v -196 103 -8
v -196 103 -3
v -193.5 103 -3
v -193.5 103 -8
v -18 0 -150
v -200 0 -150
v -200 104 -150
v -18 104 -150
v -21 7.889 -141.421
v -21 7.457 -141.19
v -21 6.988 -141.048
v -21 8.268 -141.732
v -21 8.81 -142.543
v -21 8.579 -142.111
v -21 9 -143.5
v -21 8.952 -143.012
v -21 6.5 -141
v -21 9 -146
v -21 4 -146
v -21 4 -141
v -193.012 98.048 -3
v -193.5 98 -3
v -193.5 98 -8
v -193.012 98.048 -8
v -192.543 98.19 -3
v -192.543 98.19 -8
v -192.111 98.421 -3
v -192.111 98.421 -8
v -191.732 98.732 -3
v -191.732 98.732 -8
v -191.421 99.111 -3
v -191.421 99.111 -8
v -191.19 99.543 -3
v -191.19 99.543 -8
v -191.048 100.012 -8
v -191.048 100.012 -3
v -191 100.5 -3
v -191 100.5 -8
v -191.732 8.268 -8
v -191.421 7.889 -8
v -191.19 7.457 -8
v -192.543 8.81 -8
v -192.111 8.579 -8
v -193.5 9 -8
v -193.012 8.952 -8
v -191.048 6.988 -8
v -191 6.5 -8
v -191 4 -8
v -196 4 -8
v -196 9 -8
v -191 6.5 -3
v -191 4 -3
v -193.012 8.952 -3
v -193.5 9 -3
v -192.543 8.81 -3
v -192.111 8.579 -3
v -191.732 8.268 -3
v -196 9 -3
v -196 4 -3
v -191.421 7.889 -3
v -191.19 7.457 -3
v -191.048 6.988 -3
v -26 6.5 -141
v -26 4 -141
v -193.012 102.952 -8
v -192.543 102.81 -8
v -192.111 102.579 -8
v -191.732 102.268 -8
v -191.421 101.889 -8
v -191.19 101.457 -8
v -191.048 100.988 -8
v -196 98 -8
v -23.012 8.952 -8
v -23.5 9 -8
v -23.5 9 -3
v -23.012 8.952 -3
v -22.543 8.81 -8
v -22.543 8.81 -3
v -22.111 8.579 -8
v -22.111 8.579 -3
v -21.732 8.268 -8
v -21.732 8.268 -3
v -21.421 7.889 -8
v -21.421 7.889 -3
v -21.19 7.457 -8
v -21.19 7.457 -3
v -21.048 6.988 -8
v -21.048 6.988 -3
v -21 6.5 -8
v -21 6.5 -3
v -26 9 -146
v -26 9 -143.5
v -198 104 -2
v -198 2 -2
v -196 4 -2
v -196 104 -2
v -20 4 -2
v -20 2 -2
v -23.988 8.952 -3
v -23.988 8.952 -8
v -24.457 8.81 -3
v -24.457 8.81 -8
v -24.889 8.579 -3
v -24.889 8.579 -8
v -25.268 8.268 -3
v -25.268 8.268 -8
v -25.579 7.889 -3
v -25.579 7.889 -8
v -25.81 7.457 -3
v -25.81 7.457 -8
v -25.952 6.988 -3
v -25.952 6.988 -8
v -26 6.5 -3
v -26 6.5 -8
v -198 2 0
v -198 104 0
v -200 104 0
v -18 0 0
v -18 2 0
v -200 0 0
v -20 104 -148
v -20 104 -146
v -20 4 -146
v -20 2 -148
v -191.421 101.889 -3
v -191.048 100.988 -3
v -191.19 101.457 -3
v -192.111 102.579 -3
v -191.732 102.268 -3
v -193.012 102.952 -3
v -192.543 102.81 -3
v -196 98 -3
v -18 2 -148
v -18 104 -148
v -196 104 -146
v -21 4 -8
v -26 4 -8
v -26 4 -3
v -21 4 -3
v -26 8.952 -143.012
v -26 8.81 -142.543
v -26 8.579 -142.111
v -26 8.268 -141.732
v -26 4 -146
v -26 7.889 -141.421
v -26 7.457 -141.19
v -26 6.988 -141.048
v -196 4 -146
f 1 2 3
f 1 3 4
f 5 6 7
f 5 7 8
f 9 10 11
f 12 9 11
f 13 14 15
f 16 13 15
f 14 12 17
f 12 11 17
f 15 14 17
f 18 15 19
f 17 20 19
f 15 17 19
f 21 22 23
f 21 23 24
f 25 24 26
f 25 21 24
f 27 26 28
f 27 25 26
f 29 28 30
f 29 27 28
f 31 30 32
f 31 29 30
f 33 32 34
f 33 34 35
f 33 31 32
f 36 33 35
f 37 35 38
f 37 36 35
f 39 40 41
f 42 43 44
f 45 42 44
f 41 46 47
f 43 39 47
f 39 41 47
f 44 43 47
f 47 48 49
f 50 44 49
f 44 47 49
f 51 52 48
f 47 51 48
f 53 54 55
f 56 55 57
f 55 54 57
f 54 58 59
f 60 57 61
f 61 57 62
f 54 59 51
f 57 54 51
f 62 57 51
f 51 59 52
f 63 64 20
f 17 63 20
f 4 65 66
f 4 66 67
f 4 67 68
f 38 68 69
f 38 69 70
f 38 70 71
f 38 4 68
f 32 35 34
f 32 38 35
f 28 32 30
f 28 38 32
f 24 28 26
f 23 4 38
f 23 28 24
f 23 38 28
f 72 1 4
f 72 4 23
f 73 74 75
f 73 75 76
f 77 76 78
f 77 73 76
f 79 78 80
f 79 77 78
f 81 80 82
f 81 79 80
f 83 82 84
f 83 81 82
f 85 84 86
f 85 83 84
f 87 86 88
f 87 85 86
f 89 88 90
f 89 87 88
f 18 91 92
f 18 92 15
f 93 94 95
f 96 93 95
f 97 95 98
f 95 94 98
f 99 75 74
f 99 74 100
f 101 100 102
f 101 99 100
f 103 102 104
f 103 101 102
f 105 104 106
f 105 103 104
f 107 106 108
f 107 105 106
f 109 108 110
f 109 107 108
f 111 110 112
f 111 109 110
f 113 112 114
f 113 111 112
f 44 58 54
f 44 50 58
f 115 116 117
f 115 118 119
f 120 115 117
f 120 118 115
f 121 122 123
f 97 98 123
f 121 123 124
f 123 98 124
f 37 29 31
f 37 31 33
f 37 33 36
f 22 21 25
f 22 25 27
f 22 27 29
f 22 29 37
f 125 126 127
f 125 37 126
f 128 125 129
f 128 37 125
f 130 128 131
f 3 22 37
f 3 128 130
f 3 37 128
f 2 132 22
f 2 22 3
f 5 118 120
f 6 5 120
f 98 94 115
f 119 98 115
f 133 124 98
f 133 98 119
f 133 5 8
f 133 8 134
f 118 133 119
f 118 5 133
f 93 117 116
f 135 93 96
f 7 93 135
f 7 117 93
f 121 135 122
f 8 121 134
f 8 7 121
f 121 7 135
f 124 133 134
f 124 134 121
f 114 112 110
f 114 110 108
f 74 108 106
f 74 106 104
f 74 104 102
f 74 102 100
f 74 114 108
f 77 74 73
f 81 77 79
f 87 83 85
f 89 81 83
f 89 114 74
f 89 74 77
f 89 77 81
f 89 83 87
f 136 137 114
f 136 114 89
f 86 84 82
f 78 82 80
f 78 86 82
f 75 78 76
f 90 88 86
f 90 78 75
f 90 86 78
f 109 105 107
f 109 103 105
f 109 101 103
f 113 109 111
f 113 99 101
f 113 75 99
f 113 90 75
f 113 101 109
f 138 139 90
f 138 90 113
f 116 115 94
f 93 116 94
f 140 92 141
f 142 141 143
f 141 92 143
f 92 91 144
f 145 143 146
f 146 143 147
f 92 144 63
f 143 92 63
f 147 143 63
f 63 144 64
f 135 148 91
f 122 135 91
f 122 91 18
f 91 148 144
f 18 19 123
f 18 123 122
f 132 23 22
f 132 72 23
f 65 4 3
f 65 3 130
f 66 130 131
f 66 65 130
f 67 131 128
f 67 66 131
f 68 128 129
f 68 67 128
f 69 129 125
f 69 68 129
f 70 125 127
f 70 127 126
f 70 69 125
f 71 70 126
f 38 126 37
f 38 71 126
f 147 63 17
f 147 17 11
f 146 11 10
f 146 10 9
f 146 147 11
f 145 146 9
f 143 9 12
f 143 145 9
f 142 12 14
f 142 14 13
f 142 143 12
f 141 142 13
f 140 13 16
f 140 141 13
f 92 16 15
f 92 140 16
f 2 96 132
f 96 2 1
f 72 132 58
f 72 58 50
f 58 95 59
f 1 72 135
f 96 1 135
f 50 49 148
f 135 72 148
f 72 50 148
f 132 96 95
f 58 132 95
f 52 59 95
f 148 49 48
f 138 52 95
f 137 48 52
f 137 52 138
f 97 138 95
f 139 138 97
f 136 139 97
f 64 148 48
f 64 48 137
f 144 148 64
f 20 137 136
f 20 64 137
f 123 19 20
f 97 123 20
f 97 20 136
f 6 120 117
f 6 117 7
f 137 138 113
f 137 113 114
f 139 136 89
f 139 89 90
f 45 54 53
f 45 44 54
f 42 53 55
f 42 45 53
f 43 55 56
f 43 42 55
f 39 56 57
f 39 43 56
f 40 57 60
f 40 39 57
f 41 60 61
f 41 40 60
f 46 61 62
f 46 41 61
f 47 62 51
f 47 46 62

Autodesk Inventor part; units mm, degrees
ref_plane "YZ Plane" through (0, 0, 0) normal (1, 0, 0) x (0, 1, 0)
ref_plane "XZ Plane" through (0, 0, 0) normal (0, 1, 0) x (-1, 0, 0)
sketch "Sketch1" plane through (0, 0, 0) normal (0, 1, 0) x (-1, 0, 0)
  line L0 (0, 0) -> (200, 0)
  line L1 (200, 0) -> (200, -150)
  line L2 (200, -150) -> (0, -150)
  line L3 (0, -150) -> (0, 0)
  dimension "d0" = 200
  dimension "d1" = 150
extrude "Extrusion1" add sketch "Sketch1" along normal blind 2
sketch "Sketch2" plane through (0, 2, 0) normal (0, 1, 0) x (1, 0, 0)
  line L0 (-200, 0) -> (0, 0) projected
  line L1 (-200, 0) -> (-200, 2)
  line L2 (-200, 150) -> (-200, 0) projected
  line L3 (-200, 2) -> (-2, 2)
  line L4 (-2, 2) -> (-2, 150)
  line L5 (0, 150) -> (-200, 150) projected
  line L6 (-200, 2) -> (-200, 150)
  line L7 (-200, 150) -> (-2, 150)
  dimension "d4" = 2
  dimension "d5" = 198
extrude "Extrusion2" add sketch "Sketch2" along normal blind 2
sketch "Sketch3" plane through (0, 4, 0) normal (0, 1, 0) x (1, 0, 0)
  line L0 (0, 0) -> (0, 150) projected
  line L1 (0, 0) -> (-198, 0)
  line L2 (-198, 0) -> (-198, 148)
  line L3 (-198, 148) -> (0, 148)
  line L4 (0, 148) -> (0, 0)
  line L5 (0, 150) -> (-200, 150) projected
  line L6 (-200, 150) -> (0, 150)
  line L7 (0, 150) -> (0, 0)
  line L8 (0, 0) -> (-200, 0)
  line L9 (-200, 0) -> (-200, 150)
  dimension "d8" = 198
  dimension "d9" = 148
extrude "Extrusion3" add sketch "Sketch3" along normal blind 100 and the other way blind 2 contours L3 L2 L8 L9 L5 L0
sketch "Sketch4" plane through (0, 4, 0) normal (0, 1, 0) x (1, 0, 0)
  line L0 (-198, 2) -> (-2, 2) projected
  line L1 (-198, 2) -> (-196, 2)
  line L2 (-196, 2) -> (-196, 146)
  line L3 (-2, 148) -> (-198, 148) projected
  line L4 (-196, 146) -> (-2, 146)
  line L5 (-2, 2) -> (-2, 148) projected
  line L6 (-2, 2) -> (-198, 2)
  line L7 (-198, 2) -> (-198, 148)
  line L8 (-198, 148) -> (-2, 148)
  line L9 (-2, 148) -> (-2, 2)
  point P0 (0, 0)
  dimension "d14" = 2
  dimension "d15" = 144
extrude "Extrusion4" add sketch "Sketch4" along normal blind 100 contours L7 L3 L5 L4 L2 L0
sketch "Sketch7" plane through (0, 4, 0) normal (0, 1, 0) x (1, 0, 0)
  line L0 (-196, 2) -> (-2, 2) projected
  line L1 (-196, 2) -> (-196, 3)
  line L2 (-196, 146) -> (-196, 2) projected
  line L3 (-196, 3) -> (-191, 3)
  line L4 (-191, 3) -> (-191, 8)
  line L5 (-191, 8) -> (-196, 8)
  point P0 (0, 0)
  point P1 (-196, 117.9293)
  dimension "d36" = 1
  dimension "d37" = 5
  dimension "d38" = 5
extrude "Extrusion7" add sketch "Sketch7" along normal blind 5
fillet "Fillet2" radius 2.5 1 edges at (-191, 9, -5.5)
sketch "Sketch9" plane through (0, 4, 0) normal (0, 1, 0) x (1, 0, 0)
  line L0 (-196, 2) -> (-2, 2) projected
  line L1 (-2, 2) -> (-2, 3)
  line L2 (-2, 2) -> (-2, 146) projected
  line L3 (-2, 3) -> (-3, 3)
  line L4 (-3, 3) -> (-8, 3)
  line L5 (-8, 3) -> (-8, 8)
  line L6 (-8, 8) -> (-3, 8)
  line L7 (-3, 8) -> (-3, 3)
  point P0 (0, 0)
  dimension "d45" = 1
  dimension "d46" = 1
  dimension "d47" = 5
  dimension "d48" = 5
extrude "Extrusion9" add sketch "Sketch9" along normal blind 5
fillet "Fillet3" radius 2.5 2 edges at (-8, 9, -5.5) (-3, 9, -5.5)
sketch "Sketch10" plane through (-8, 4, -3) normal (0, 0, 1) x (1, 0, 0)
  arc A0 (5, 2.5) -> (0, 2.5) centre (2.5, 2.5) ccw projected
  circle A1 centre (2.5, 2.5) radius 1
  point P0 (8, -4)
  dimension "d52" = 2
extrude "Extrusion10" cut sketch "Sketch10" against normal blind 5
sketch "Sketch11" plane through (0, 4, 0) normal (0, 1, 0) x (1, 0, 0)
  line L0 (-2, 146) -> (-196, 146) projected
  line L1 (-2, 146) -> (-3, 146)
  line L2 (-3, 146) -> (-8, 146)
  line L3 (-8, 146) -> (-8, 141)
  line L4 (-8, 141) -> (-3, 141)
  line L5 (-3, 141) -> (-3, 146)
  point P0 (0, 0)
  point P1 (-144.9293, 146)
  dimension "d55" = 1
  dimension "d56" = 5
  dimension "d57" = 5
extrude "Extrusion11" add sketch "Sketch11" along normal blind 5
fillet "Fillet4" radius 2.5 1 edges at (-5.5, 9, -141)
sketch "Sketch12" plane through (-3, 4, -141) normal (1, 0, 0) x (0, 0, -1)
  arc A0 (2.5, 5) -> (0, 2.5) centre (2.5, 2.5) ccw projected
  circle A1 centre (2.5, 2.5) radius 1
  point P0 (-141, -4)
  dimension "d61" = 2
extrude "Extrusion12" cut sketch "Sketch12" against normal blind 5
sketch "Sketch13" plane through (-196, 104, -146) normal (0, 0, 1) x (1, 0, 0)
  line L0 (0, 0) -> (194, 0) projected
  line L1 (194, 0) -> (193, 0)
  line L2 (193, 0) -> (193, -1)
  line L3 (193, -1) -> (188, -1)
  line L4 (188, -1) -> (188, -6)
  line L5 (188, -6) -> (193, -6)
  line L6 (193, -6) -> (193, -1)
  point P0 (196, -104)
  dimension "d64" = 1
  dimension "d65" = 1
  dimension "d66" = 5
  dimension "d67" = 5
extrude "Extrusion13" add sketch "Sketch13" along normal blind 5
fillet "Fillet5" radius 2.5 2 edges at (-5.5, 103, -141) (-5.5, 98, -141)
sketch "Sketch14" plane through (-3, 98, -146) normal (1, 0, 0) x (0, 0, -1)
  arc A0 (-2.5, 5) -> (-2.5, 0) centre (-2.5, 2.5) ccw projected
  circle A1 centre (-2.5, 2.5) radius 1
  point P0 (-146, -98)
  dimension "d71" = 2
extrude "Extrusion14" cut sketch "Sketch14" against normal blind 5
sketch "Sketch15" plane through (-196, 4, -2) normal (1, 0, 0) x (0, 0, -1)
  line L0 (0, 100) -> (0, -2) projected
  line L1 (0, 100) -> (1, 100)
  line L2 (148, 100) -> (-2, 100) projected
  line L3 (1, 100) -> (1, 99)
  line L4 (1, 99) -> (6, 99)
  line L5 (6, 99) -> (6, 94)
  line L6 (6, 94) -> (1, 94)
  line L7 (1, 94) -> (1, 99)
  point P0 (-2, -4)
  dimension "d74" = 1
  dimension "d75" = 1
  dimension "d76" = 5
  dimension "d77" = 5
extrude "Extrusion15" add sketch "Sketch15" along normal blind 5
fillet "Fillet6" radius 2.5 2 edges at (-191, 103, -5.5) (-191, 98, -5.5)
sketch "Sketch17" plane through (0, 4, 0) normal (0, 1, 0) x (1, 0, 0)
  point P0 (0, 0)
sketch "Sketch18" plane through (0, 4, 0) normal (0, 1, 0) x (1, 0, 0)
  line L0 (-196, 2) -> (-196, 146) projected
  line L1 (-196, 84.7457) -> (-26, 84.7457)
  line L2 (0, 0) -> (0, 150) projected
  line L3 (-26, 84.7457) -> (-26, 146)
  line L4 (-196, 146) -> (-2, 146) projected
  line L5 (-26, 84.7457) -> (-26, 2)
  line L6 (-196, 2) -> (-2, 2) projected
  line L7 (-26, 143.5) -> (-27, 143.5)
  line L8 (-27, 143.5) -> (-2, 143.5)
  line L9 (-2, 148) -> (-2, 2) projected
  line L10 (-14.5, 143.5) -> (-14.5, 2)
  line L11 (-14.5, 143.5) -> (-16.2266, 143.5)
  line L12 (-16.2266, 143.5) -> (-16.2266, 2)
  line L13 (-16.2266, 2) -> (-14.5, 2)
  line L14 (-14.5, 2) -> (-14.5, 143.5)
  line L15 (-16.2266, 143.5) -> (-14.5, 143.5)
  line L16 (-14.5, 143.5) -> (-14.5, 2)
  line L17 (-14.5, 2) -> (-16.2266, 2)
  line L18 (-16.2266, 2) -> (-16.2266, 143.5)
  dimension "d84" = 170
  dimension "d85" = 1
sketch "Sketch19" plane through (0, 4, 0) normal (0, 1, 0) x (1, 0, 0)
  point P0 (0, 0)
extrude "Extrusion17" add sketch "Sketch18" along normal blind 10 contours L12 L8 L10 L6
ref_plane "Work Plane1" through (-14.5, 14, -2) normal (-1, 0, 0) x (0, 0, -1)
mirror "Mirror1" about plane through (-14.5, 4, -2) normal (1, 0, 0) of "Fillet3", "Extrusion9", "Extrusion11", "Fillet4"
sketch "Sketch20" plane through (0, 2, 0) normal (0, 1, 0) x (1, 0, 0)
  line L0 (-26, 143.5) -> (-21, 143.5) projected
  line L1 (-21, 143.5) -> (-20, 143.5)
  line L2 (-8, 146) -> (-21, 146) projected
  line L3 (-2, 148) -> (-2, 2) projected
  line L4 (-20, 146) -> (-2, 146)
  line L5 (-2, 146) -> (-2, 2)
  line L6 (-2, 2) -> (-20, 2)
  line L7 (-20, 2) -> (-20, 146)
  line L8 (0, 148) -> (-2, 148) projected
  line L9 (-20, 2) -> (-2, 2)
  line L10 (-2, 2) -> (-2, 148)
  line L11 (-2, 148) -> (-20, 148)
  line L12 (-20, 148) -> (-20, 2)
  point P0 (0, 0)
  dimension "d88" = 1
extrude "Extrusion18" cut sketch "Sketch20" along normal blind 1000
sketch "Sketch21" plane through (0, 2, 0) normal (0, 1, 0) x (1, 0, 0)
  line L0 (-20, 148) -> (-20, 2) projected
  line L1 (-20, 2) -> (-18, 2)
  line L2 (-198, 0) -> (0, 0) projected
  line L3 (0, 150) -> (-200, 150) projected
  line L4 (-18, 0) -> (0, 0)
  line L5 (0, 0) -> (0, 150)
  line L6 (0, 150) -> (-18, 150)
  line L7 (-18, 150) -> (-18, 0)
  dimension "d91" = 2
extrude "Extrusion19" cut sketch "Sketch21" along normal mid plane 1000
sketch "Sketch23" plane through (0, 4, 0) normal (0, 1, 0) x (1, 0, 0)
  point P0 (0, 0)
properties part number "kevnat part1"
